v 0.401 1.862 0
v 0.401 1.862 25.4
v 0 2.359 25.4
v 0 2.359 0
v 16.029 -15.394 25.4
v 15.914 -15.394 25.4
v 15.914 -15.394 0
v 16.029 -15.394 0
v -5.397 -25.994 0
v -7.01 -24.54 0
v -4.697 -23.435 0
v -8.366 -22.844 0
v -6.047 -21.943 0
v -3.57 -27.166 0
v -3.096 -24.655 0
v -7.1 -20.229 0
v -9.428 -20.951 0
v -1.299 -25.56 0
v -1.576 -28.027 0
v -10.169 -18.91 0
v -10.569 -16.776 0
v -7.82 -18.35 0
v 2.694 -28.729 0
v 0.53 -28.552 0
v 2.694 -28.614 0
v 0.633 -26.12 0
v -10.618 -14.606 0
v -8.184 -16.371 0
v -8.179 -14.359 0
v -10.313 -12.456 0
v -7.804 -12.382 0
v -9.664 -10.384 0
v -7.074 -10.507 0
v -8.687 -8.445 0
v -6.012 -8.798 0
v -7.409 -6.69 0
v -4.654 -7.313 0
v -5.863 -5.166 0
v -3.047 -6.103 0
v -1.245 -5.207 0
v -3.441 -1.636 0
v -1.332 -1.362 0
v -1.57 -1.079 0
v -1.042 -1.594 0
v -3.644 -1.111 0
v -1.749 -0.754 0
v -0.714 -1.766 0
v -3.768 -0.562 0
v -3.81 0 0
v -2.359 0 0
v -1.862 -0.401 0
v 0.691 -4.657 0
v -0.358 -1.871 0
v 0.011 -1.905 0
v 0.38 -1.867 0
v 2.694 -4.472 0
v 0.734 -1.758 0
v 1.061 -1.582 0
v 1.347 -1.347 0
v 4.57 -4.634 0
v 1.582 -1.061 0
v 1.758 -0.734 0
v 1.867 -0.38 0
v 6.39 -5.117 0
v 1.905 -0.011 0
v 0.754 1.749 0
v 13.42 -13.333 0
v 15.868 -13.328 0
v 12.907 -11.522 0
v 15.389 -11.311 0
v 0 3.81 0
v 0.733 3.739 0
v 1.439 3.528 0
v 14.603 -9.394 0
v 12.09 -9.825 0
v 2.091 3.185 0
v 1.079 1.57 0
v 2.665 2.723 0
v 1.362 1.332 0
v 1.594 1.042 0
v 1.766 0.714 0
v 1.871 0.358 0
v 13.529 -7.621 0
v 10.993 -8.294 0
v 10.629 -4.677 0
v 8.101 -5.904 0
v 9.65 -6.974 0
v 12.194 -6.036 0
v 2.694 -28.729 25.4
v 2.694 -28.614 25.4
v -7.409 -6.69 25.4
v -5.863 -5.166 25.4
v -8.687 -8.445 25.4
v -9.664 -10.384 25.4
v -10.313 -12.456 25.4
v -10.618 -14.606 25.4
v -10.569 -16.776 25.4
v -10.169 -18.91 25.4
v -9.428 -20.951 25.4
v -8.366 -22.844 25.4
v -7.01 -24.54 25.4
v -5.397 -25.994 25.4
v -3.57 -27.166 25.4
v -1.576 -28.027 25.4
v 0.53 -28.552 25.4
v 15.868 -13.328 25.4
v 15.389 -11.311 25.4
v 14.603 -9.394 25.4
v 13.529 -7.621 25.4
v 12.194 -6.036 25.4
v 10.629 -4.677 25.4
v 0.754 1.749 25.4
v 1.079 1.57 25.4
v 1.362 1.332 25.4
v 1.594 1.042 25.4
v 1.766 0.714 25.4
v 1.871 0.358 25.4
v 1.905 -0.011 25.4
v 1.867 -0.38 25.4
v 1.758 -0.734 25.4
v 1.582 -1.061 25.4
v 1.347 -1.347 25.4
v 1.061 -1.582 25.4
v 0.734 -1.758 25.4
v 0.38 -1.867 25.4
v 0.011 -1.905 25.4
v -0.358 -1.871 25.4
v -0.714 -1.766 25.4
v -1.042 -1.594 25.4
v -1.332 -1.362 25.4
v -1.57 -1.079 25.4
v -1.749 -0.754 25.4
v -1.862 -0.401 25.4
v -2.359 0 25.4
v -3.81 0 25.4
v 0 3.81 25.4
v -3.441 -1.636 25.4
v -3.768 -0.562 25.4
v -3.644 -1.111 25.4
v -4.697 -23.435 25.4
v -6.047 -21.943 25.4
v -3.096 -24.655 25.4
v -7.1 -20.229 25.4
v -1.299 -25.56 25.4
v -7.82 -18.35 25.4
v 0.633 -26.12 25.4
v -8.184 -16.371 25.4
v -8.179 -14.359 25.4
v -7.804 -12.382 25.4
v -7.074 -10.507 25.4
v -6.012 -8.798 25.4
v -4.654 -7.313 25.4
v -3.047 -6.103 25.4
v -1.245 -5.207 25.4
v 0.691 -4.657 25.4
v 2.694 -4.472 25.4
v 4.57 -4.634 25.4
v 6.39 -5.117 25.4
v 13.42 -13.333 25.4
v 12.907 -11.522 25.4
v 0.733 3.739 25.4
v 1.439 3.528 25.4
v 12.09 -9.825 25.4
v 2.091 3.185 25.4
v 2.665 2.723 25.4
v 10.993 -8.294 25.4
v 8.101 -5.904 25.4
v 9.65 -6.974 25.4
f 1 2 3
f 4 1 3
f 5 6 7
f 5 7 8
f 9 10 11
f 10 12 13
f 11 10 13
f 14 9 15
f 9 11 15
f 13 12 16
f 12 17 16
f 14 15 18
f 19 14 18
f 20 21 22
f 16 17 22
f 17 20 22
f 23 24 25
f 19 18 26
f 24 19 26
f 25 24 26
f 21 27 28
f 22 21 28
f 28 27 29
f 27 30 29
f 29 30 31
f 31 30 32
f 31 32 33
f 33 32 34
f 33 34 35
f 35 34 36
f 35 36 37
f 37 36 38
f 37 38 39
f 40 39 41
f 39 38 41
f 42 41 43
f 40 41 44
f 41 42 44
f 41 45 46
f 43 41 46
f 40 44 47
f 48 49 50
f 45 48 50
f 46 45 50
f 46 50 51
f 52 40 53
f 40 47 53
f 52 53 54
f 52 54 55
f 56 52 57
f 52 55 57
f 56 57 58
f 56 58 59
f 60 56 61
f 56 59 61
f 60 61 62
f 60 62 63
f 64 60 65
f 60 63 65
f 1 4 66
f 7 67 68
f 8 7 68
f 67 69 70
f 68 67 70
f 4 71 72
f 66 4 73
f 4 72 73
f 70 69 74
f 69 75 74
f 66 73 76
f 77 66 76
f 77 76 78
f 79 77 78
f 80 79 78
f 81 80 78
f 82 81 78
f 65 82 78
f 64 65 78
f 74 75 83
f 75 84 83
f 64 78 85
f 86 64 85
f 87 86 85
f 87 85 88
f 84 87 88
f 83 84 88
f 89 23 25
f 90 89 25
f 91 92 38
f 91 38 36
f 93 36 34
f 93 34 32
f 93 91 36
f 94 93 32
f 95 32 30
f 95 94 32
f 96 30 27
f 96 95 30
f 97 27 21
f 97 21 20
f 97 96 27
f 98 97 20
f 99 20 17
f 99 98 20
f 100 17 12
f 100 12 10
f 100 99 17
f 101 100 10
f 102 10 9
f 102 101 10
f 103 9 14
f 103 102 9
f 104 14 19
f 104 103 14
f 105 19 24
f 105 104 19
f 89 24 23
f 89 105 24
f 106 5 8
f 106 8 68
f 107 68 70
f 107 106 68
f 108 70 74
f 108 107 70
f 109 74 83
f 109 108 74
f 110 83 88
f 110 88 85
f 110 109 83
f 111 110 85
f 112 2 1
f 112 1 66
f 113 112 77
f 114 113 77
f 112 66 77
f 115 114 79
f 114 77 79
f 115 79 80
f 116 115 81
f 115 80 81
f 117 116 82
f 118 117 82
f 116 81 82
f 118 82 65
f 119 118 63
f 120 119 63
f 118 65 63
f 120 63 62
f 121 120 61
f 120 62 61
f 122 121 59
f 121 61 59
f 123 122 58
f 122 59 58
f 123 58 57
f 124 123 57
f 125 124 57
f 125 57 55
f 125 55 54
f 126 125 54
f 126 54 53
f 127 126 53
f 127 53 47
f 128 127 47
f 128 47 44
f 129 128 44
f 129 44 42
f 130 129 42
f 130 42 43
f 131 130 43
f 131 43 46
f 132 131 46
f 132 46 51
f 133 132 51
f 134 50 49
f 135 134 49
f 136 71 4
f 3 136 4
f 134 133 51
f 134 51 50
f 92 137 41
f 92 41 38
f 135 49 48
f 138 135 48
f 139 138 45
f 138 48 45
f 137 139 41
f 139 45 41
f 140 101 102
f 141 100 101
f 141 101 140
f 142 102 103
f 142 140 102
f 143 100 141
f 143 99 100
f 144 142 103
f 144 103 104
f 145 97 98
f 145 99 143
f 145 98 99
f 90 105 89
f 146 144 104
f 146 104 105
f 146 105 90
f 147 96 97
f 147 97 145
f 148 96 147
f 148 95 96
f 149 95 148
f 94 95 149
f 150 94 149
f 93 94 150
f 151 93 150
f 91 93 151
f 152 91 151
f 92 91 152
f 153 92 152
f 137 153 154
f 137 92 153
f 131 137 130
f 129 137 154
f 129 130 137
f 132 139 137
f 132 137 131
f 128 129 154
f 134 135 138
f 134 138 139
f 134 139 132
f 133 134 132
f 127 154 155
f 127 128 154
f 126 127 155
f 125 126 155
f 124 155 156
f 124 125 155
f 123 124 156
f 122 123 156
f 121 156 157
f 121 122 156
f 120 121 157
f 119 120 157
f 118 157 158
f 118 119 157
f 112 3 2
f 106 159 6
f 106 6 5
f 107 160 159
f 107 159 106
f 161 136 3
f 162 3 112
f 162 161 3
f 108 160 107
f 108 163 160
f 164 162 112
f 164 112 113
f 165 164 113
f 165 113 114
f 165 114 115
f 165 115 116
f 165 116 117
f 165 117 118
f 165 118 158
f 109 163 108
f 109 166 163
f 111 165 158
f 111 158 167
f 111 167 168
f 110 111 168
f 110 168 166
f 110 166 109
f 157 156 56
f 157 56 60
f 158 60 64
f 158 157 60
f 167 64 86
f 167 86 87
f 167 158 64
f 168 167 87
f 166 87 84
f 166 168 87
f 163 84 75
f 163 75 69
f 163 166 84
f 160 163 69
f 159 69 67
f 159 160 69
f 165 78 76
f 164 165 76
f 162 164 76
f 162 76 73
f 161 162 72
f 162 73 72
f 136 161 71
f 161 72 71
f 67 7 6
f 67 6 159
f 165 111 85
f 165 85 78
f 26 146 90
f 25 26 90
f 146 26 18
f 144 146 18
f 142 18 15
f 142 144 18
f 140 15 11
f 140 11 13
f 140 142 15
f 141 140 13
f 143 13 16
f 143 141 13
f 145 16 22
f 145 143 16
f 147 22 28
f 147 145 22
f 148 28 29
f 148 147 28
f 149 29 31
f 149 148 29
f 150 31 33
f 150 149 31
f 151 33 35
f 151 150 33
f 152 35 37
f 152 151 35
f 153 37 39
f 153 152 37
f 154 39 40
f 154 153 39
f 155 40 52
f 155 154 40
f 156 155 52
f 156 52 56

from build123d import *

# Parameters (mm, degrees)
F1_DEPTH    = 25.4
F3_DEPTH    = 25.4
F4_T1_DEPTH = 37.28706828
F5_T1_DEPTH = 27.7495122548


# Not quite as in the source:
# - a fillet or chamfer that OpenCascade refuses, or shapes differently, is made with other operations: its cross-section is extruded or revolved along the edge and cut away or added


with BuildPart() as f1:
    # F0 (on Top) → F1 (new body)
    with BuildSketch(Plane.XY):
        with BuildLine():
            ThreePointArc((0, 1.905), (1.3470384182, -1.3470384182), (-1.905, 0))
            Line((-1.905, 0), (-3.81, 0))
            ThreePointArc((-3.81, 0), (2.6940768363, -2.6940768363), (0, 3.81))
            Line((0, 3.81), (0, 1.905))
        make_face()
    extrude(amount=F1_DEPTH)

    # F2 (on face) → F3 (join)
    with BuildSketch(Plane.XY.offset(25.4)):
        with BuildLine():
            ThreePointArc((3.1994926084, -2.0686582726), (2.9633304397, -2.3947385463), (2.6940768363, -2.6940768363))
            Line((2.6940768363, -2.6940768363), (2.6940768363, -4.4720768363))
            ThreePointArc((2.6940768363, -4.4720768363), (10.4170971004, -7.6710565722), (13.6160768363, -15.3940768363))
            Line((13.6160768363, -15.3940768363), (16.0290768363, -15.3940768363))
            ThreePointArc((16.0290768363, -15.3940768363), (14.6027952108, -9.393689209), (10.6290540875, -4.6768775275))
            ThreePointArc((10.6290540875, -4.6768775275), (7.1111754901, -2.8118884542), (3.1994926084, -2.0686582726))
        make_face()
        with BuildLine():
            Line((2.5200781238, 2.8575), (2.6649185174, 2.7229229323))
            ThreePointArc((2.6649185174, 2.7229229323), (2.5933714137, 2.7911511444), (2.5200781238, 2.8575))
        make_face()
        with BuildLine():
            Line((2.6940768363, -4.4720768363), (2.6940768363, -2.6940768363))
            ThreePointArc((2.6940768363, -2.6940768363), (0.2570925649, -3.8013160107), (-2.3067877079, -3.0322978862))
            ThreePointArc((-2.3067877079, -3.0322978862), (-4.1681303207, -3.9602525446), (-5.862543163, -5.1663459449))
            ThreePointArc((-5.862543163, -5.1663459449), (-9.840056888, -19.9457487029), (2.6940768363, -28.7290768363))
            Line((2.6940768363, -28.7290768363), (2.6940768363, -26.3160768363))
            ThreePointArc((2.6940768363, -26.3160768363), (-8.2279231637, -15.3940768363), (2.6940768363, -4.4720768363))
        make_face()
        with BuildLine():
            ThreePointArc((2.6649185174, 2.7229229323), (3.7865078996, 0.4224428078), (3.1994926084, -2.0686582726))
            ThreePointArc((3.1994926084, -2.0686582726), (7.1111754901, -2.8118884542), (10.6290540875, -4.6768775275))
            Line((10.6290540875, -4.6768775275), (2.6649185174, 2.7229229323))
        make_face()
        with BuildLine():
            ThreePointArc((-5.862543163, -5.1663459449), (-4.1681303207, -3.9602525446), (-2.3067877079, -3.0322978862))
            ThreePointArc((-2.3067877079, -3.0322978862), (-2.9573260731, -2.4021495576), (-3.4407495541, -1.6362586916))
            Line((-3.4407495541, -1.6362586916), (-5.862543163, -5.1663459449))
        make_face()
    extrude(amount=-F3_DEPTH)

    # F4: chamfer of 2.54 on 2 edges, made by hand

    # F4_s2 → F4_t1 (cut)
    with BuildSketch(Plane.XY.offset(-5.94353414)):
        with BuildLine():
            Line((0.6333221193, -26.1199042634), (2.6940768363, -28.6142827349))
            Line((2.6940768363, -28.6142827349), (2.6940768363, -26.3160768363))
            ThreePointArc((2.6940768363, -26.3160768363), (1.6230071606, -26.2634325555), (0.6333221193, -26.1199042634))
        make_face()
        with BuildLine():
            Line((15.9142827349, -15.3940768363), (13.4199042634, -13.3333221193))
            ThreePointArc((13.4199042634, -13.3333221193), (13.5634325555, -14.3230071606), (13.6160768363, -15.3940768363))
            Line((13.6160768363, -15.3940768363), (15.9142827349, -15.3940768363))
        make_face()
    extrude(amount=F4_T1_DEPTH, mode=Mode.SUBTRACT)

    # F5: chamfer of 0.508 on 2 edges, made by hand

    # F5_s2 → F5_t1 (cut)
    with BuildSketch(Plane.XY.offset(-1.1747561274)):
        with BuildLine():
            Line((-1.8623055031, -0.4010526316), (-2.3589203039, 0))
            Line((-2.3589203039, 0), (-1.905, 0))
            ThreePointArc((-1.905, 0), (-1.8935148697, -0.2088694284), (-1.8623055031, -0.4010526316))
        make_face()
        with BuildLine():
            Line((0.4010526316, 1.8623055031), (0, 2.3589203039))
            Line((0, 2.3589203039), (0, 1.905))
            ThreePointArc((0, 1.905), (0.2088694284, 1.8935148697), (0.4010526316, 1.8623055031))
        make_face()
    extrude(amount=F5_T1_DEPTH, mode=Mode.SUBTRACT)


solid = f1.part
